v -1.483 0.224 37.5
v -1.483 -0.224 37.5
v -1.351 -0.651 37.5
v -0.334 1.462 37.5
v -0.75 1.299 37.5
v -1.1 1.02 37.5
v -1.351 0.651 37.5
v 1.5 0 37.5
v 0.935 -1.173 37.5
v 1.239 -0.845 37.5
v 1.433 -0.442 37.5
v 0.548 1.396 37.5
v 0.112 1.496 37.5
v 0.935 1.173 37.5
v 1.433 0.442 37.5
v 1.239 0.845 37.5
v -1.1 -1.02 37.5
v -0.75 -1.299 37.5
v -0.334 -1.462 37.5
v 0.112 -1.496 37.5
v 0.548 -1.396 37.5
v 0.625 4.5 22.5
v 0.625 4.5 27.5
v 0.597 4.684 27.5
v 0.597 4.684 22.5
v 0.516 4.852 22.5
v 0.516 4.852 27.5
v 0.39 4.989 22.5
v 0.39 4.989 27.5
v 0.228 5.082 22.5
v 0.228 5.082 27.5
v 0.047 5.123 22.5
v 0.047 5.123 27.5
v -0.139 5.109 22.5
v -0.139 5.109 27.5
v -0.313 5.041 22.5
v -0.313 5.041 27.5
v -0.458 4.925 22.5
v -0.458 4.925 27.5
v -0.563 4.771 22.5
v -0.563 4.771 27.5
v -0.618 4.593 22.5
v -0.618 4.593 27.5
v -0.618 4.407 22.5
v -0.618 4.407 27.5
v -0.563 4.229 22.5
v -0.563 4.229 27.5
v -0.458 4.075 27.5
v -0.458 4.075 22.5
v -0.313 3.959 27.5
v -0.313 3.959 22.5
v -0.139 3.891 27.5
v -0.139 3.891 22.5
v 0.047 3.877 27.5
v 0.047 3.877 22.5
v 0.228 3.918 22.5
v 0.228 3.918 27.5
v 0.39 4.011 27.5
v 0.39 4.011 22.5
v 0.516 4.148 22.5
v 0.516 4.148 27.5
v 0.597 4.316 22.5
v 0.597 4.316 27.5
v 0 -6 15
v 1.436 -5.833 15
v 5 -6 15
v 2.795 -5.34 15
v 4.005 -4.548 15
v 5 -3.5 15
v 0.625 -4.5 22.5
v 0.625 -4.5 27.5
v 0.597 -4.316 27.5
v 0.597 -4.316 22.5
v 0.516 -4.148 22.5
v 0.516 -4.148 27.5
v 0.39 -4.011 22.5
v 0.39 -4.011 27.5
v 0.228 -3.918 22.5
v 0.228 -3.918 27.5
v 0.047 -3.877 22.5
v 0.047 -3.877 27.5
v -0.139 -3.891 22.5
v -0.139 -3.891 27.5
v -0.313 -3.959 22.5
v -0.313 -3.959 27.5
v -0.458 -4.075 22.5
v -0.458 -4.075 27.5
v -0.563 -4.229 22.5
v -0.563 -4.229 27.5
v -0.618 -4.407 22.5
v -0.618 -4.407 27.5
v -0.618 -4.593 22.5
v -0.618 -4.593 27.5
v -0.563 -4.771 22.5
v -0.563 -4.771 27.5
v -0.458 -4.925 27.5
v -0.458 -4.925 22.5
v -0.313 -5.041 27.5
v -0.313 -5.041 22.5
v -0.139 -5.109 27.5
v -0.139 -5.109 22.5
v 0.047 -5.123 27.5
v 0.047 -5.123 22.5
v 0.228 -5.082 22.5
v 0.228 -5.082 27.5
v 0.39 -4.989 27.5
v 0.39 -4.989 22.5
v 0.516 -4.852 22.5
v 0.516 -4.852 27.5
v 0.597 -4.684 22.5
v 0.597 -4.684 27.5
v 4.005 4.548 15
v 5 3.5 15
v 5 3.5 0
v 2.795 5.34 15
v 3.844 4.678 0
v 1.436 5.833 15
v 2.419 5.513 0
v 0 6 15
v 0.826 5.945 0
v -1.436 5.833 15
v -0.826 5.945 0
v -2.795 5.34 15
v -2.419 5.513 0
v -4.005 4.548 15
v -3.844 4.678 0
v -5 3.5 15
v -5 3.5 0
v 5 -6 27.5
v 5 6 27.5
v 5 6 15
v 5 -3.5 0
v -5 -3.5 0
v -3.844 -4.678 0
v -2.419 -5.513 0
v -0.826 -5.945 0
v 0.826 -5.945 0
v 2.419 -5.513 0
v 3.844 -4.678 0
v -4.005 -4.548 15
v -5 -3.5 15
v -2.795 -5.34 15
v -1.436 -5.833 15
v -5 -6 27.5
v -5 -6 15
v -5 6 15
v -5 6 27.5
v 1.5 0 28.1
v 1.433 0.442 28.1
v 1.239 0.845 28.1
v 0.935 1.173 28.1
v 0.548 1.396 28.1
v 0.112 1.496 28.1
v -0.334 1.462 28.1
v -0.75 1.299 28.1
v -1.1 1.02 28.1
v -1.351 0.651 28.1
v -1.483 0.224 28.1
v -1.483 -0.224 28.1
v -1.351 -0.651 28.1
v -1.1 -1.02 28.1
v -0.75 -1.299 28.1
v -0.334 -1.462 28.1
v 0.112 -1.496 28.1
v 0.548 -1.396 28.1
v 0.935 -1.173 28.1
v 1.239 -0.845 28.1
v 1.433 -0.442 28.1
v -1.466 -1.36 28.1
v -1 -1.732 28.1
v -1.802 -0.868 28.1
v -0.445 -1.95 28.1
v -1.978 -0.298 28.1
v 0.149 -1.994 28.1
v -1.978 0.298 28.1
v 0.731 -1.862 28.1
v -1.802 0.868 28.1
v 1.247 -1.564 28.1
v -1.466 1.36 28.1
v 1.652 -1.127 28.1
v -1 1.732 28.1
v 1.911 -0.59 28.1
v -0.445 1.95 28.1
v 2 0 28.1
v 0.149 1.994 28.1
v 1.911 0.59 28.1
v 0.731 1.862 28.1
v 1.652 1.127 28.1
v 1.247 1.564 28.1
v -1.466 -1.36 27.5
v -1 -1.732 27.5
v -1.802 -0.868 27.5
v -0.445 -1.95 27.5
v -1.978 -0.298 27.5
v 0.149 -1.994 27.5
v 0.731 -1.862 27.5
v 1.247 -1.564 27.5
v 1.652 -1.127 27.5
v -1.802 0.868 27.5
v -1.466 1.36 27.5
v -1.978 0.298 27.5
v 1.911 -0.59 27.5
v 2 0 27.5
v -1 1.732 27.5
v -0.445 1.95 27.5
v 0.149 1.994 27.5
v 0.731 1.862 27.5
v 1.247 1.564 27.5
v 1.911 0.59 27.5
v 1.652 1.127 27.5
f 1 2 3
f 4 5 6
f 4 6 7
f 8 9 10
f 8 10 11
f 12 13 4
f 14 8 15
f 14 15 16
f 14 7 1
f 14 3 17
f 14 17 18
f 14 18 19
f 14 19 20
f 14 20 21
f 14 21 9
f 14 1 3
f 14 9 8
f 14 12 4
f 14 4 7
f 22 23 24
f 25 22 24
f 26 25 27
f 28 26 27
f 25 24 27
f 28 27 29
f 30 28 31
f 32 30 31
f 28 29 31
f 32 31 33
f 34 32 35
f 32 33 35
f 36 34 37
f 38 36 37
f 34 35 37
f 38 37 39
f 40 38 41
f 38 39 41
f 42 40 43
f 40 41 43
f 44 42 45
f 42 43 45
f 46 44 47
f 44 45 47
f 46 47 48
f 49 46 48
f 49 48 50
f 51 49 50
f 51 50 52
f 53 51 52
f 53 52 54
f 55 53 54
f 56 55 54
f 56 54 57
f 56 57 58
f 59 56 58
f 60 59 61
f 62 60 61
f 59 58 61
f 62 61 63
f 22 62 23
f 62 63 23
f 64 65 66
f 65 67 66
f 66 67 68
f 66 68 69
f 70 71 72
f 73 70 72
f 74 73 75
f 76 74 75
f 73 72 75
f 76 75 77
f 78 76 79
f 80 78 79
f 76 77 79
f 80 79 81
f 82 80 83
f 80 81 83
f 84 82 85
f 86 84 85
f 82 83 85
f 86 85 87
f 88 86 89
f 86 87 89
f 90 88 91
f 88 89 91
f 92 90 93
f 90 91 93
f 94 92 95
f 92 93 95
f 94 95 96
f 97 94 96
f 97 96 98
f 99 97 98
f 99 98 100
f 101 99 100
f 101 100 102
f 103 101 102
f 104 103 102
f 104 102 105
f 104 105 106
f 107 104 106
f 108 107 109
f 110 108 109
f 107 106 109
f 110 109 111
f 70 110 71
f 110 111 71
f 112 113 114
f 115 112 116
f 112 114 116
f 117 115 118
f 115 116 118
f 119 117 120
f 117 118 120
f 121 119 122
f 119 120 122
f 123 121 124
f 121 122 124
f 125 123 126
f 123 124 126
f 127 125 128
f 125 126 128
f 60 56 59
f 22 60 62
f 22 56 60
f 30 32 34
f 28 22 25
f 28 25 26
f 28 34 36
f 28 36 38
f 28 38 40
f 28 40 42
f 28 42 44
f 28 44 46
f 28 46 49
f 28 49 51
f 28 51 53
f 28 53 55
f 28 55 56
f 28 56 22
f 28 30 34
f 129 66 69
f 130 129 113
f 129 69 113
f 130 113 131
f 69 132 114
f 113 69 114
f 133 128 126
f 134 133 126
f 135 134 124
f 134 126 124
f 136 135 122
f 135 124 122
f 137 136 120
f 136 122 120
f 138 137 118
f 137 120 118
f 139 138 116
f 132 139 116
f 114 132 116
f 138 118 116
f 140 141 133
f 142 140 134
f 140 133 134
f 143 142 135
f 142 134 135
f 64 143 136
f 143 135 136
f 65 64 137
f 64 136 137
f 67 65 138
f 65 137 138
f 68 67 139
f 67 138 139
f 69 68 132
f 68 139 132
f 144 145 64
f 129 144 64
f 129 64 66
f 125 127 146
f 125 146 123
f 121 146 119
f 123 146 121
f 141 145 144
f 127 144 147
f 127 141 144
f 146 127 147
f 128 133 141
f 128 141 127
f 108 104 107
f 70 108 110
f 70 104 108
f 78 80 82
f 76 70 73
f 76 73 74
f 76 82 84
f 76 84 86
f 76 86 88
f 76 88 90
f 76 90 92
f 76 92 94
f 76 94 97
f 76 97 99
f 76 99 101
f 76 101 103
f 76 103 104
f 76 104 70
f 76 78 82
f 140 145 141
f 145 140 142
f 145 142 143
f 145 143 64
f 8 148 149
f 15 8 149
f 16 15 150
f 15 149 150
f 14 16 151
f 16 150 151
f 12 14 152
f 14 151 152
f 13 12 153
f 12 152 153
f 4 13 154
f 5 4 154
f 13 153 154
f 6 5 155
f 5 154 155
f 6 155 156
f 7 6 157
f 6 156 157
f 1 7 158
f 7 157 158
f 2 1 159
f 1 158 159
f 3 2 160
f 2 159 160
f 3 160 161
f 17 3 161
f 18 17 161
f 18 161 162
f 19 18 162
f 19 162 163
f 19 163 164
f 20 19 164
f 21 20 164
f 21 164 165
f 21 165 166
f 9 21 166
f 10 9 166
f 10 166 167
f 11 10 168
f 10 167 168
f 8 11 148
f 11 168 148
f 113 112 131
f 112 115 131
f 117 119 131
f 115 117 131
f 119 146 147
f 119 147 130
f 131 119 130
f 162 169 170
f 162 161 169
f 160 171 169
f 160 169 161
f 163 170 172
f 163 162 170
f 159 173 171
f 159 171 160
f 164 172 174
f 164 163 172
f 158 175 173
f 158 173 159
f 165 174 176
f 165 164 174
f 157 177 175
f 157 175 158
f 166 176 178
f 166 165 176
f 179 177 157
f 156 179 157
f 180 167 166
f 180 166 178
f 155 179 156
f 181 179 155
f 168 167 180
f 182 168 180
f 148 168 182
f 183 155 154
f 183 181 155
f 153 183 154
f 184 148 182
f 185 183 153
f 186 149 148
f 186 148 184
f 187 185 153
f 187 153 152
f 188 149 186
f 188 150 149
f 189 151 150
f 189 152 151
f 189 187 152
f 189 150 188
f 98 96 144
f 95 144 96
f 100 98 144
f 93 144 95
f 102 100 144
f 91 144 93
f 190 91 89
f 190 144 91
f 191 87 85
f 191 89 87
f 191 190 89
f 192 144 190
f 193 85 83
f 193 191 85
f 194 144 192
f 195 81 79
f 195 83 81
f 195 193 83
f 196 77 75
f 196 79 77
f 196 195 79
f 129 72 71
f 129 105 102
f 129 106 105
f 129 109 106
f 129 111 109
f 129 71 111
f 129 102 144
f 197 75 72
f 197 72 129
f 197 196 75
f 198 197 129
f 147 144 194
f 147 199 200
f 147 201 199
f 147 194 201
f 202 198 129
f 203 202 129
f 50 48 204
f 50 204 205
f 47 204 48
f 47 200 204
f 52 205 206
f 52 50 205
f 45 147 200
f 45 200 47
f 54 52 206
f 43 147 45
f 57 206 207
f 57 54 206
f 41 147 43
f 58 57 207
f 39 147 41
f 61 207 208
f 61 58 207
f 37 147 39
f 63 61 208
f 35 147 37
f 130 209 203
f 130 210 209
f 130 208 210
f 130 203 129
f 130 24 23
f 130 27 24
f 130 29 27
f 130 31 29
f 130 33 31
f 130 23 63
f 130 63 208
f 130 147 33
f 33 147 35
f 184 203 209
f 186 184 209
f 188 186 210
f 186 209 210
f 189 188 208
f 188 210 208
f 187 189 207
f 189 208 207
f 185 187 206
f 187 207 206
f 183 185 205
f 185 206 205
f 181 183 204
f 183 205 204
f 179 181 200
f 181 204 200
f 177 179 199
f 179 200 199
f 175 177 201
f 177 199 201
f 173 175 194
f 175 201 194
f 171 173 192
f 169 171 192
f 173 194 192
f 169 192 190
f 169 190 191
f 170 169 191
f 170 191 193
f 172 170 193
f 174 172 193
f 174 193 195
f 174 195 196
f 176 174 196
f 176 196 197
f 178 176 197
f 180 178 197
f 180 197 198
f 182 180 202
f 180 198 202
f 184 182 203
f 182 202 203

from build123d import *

# Parameters (mm, degrees)
PAD_DEPTH    = 15
SKETCH001_W  = 10
SKETCH001_H  = 12
PAD001_DEPTH = 12.5
SKETCH002_R  = 0.625
POCKET_DEPTH = 5
SKETCH003_R  = 2
PAD002_DEPTH = 0.6
SKETCH004_R  = 1.5
PAD003_DEPTH = 9.4


with BuildPart() as part:
    # Sketch → Pad (new body)
    with BuildSketch(Plane.XY):
        with BuildLine():
            Line((-5, 3.5), (-5, -3.5))
            ThreePointArc((-5, -3.5), (0, -6), (5, -3.5))
            Line((5, 3.5), (5, -3.5))
            ThreePointArc((5, 3.5), (0, 6), (-5, 3.5))
        make_face()
    extrude(amount=PAD_DEPTH)

    # Sketch001 → Pad001 (new body)
    with BuildSketch(Plane.XY.offset(15)):
        Rectangle(SKETCH001_W, SKETCH001_H)
    extrude(amount=PAD001_DEPTH)

    # Sketch002 → Pocket (cut)
    with BuildSketch(Plane.XY.offset(27.5)):
        with Locations((0, -4.5)):
            Circle(SKETCH002_R)
        with Locations((0, 4.5)):
            Circle(SKETCH002_R)
    extrude(amount=-POCKET_DEPTH, mode=Mode.SUBTRACT)

    # Sketch003 → Pad002 (new body)
    with BuildSketch(Plane.XY.offset(27.5)):
        Circle(SKETCH003_R)
    extrude(amount=PAD002_DEPTH)

    # Sketch004 → Pad003 (new body)
    with BuildSketch(Plane.XY.offset(28.1)):
        Circle(SKETCH004_R)
    extrude(amount=PAD003_DEPTH)


solid = part.part
